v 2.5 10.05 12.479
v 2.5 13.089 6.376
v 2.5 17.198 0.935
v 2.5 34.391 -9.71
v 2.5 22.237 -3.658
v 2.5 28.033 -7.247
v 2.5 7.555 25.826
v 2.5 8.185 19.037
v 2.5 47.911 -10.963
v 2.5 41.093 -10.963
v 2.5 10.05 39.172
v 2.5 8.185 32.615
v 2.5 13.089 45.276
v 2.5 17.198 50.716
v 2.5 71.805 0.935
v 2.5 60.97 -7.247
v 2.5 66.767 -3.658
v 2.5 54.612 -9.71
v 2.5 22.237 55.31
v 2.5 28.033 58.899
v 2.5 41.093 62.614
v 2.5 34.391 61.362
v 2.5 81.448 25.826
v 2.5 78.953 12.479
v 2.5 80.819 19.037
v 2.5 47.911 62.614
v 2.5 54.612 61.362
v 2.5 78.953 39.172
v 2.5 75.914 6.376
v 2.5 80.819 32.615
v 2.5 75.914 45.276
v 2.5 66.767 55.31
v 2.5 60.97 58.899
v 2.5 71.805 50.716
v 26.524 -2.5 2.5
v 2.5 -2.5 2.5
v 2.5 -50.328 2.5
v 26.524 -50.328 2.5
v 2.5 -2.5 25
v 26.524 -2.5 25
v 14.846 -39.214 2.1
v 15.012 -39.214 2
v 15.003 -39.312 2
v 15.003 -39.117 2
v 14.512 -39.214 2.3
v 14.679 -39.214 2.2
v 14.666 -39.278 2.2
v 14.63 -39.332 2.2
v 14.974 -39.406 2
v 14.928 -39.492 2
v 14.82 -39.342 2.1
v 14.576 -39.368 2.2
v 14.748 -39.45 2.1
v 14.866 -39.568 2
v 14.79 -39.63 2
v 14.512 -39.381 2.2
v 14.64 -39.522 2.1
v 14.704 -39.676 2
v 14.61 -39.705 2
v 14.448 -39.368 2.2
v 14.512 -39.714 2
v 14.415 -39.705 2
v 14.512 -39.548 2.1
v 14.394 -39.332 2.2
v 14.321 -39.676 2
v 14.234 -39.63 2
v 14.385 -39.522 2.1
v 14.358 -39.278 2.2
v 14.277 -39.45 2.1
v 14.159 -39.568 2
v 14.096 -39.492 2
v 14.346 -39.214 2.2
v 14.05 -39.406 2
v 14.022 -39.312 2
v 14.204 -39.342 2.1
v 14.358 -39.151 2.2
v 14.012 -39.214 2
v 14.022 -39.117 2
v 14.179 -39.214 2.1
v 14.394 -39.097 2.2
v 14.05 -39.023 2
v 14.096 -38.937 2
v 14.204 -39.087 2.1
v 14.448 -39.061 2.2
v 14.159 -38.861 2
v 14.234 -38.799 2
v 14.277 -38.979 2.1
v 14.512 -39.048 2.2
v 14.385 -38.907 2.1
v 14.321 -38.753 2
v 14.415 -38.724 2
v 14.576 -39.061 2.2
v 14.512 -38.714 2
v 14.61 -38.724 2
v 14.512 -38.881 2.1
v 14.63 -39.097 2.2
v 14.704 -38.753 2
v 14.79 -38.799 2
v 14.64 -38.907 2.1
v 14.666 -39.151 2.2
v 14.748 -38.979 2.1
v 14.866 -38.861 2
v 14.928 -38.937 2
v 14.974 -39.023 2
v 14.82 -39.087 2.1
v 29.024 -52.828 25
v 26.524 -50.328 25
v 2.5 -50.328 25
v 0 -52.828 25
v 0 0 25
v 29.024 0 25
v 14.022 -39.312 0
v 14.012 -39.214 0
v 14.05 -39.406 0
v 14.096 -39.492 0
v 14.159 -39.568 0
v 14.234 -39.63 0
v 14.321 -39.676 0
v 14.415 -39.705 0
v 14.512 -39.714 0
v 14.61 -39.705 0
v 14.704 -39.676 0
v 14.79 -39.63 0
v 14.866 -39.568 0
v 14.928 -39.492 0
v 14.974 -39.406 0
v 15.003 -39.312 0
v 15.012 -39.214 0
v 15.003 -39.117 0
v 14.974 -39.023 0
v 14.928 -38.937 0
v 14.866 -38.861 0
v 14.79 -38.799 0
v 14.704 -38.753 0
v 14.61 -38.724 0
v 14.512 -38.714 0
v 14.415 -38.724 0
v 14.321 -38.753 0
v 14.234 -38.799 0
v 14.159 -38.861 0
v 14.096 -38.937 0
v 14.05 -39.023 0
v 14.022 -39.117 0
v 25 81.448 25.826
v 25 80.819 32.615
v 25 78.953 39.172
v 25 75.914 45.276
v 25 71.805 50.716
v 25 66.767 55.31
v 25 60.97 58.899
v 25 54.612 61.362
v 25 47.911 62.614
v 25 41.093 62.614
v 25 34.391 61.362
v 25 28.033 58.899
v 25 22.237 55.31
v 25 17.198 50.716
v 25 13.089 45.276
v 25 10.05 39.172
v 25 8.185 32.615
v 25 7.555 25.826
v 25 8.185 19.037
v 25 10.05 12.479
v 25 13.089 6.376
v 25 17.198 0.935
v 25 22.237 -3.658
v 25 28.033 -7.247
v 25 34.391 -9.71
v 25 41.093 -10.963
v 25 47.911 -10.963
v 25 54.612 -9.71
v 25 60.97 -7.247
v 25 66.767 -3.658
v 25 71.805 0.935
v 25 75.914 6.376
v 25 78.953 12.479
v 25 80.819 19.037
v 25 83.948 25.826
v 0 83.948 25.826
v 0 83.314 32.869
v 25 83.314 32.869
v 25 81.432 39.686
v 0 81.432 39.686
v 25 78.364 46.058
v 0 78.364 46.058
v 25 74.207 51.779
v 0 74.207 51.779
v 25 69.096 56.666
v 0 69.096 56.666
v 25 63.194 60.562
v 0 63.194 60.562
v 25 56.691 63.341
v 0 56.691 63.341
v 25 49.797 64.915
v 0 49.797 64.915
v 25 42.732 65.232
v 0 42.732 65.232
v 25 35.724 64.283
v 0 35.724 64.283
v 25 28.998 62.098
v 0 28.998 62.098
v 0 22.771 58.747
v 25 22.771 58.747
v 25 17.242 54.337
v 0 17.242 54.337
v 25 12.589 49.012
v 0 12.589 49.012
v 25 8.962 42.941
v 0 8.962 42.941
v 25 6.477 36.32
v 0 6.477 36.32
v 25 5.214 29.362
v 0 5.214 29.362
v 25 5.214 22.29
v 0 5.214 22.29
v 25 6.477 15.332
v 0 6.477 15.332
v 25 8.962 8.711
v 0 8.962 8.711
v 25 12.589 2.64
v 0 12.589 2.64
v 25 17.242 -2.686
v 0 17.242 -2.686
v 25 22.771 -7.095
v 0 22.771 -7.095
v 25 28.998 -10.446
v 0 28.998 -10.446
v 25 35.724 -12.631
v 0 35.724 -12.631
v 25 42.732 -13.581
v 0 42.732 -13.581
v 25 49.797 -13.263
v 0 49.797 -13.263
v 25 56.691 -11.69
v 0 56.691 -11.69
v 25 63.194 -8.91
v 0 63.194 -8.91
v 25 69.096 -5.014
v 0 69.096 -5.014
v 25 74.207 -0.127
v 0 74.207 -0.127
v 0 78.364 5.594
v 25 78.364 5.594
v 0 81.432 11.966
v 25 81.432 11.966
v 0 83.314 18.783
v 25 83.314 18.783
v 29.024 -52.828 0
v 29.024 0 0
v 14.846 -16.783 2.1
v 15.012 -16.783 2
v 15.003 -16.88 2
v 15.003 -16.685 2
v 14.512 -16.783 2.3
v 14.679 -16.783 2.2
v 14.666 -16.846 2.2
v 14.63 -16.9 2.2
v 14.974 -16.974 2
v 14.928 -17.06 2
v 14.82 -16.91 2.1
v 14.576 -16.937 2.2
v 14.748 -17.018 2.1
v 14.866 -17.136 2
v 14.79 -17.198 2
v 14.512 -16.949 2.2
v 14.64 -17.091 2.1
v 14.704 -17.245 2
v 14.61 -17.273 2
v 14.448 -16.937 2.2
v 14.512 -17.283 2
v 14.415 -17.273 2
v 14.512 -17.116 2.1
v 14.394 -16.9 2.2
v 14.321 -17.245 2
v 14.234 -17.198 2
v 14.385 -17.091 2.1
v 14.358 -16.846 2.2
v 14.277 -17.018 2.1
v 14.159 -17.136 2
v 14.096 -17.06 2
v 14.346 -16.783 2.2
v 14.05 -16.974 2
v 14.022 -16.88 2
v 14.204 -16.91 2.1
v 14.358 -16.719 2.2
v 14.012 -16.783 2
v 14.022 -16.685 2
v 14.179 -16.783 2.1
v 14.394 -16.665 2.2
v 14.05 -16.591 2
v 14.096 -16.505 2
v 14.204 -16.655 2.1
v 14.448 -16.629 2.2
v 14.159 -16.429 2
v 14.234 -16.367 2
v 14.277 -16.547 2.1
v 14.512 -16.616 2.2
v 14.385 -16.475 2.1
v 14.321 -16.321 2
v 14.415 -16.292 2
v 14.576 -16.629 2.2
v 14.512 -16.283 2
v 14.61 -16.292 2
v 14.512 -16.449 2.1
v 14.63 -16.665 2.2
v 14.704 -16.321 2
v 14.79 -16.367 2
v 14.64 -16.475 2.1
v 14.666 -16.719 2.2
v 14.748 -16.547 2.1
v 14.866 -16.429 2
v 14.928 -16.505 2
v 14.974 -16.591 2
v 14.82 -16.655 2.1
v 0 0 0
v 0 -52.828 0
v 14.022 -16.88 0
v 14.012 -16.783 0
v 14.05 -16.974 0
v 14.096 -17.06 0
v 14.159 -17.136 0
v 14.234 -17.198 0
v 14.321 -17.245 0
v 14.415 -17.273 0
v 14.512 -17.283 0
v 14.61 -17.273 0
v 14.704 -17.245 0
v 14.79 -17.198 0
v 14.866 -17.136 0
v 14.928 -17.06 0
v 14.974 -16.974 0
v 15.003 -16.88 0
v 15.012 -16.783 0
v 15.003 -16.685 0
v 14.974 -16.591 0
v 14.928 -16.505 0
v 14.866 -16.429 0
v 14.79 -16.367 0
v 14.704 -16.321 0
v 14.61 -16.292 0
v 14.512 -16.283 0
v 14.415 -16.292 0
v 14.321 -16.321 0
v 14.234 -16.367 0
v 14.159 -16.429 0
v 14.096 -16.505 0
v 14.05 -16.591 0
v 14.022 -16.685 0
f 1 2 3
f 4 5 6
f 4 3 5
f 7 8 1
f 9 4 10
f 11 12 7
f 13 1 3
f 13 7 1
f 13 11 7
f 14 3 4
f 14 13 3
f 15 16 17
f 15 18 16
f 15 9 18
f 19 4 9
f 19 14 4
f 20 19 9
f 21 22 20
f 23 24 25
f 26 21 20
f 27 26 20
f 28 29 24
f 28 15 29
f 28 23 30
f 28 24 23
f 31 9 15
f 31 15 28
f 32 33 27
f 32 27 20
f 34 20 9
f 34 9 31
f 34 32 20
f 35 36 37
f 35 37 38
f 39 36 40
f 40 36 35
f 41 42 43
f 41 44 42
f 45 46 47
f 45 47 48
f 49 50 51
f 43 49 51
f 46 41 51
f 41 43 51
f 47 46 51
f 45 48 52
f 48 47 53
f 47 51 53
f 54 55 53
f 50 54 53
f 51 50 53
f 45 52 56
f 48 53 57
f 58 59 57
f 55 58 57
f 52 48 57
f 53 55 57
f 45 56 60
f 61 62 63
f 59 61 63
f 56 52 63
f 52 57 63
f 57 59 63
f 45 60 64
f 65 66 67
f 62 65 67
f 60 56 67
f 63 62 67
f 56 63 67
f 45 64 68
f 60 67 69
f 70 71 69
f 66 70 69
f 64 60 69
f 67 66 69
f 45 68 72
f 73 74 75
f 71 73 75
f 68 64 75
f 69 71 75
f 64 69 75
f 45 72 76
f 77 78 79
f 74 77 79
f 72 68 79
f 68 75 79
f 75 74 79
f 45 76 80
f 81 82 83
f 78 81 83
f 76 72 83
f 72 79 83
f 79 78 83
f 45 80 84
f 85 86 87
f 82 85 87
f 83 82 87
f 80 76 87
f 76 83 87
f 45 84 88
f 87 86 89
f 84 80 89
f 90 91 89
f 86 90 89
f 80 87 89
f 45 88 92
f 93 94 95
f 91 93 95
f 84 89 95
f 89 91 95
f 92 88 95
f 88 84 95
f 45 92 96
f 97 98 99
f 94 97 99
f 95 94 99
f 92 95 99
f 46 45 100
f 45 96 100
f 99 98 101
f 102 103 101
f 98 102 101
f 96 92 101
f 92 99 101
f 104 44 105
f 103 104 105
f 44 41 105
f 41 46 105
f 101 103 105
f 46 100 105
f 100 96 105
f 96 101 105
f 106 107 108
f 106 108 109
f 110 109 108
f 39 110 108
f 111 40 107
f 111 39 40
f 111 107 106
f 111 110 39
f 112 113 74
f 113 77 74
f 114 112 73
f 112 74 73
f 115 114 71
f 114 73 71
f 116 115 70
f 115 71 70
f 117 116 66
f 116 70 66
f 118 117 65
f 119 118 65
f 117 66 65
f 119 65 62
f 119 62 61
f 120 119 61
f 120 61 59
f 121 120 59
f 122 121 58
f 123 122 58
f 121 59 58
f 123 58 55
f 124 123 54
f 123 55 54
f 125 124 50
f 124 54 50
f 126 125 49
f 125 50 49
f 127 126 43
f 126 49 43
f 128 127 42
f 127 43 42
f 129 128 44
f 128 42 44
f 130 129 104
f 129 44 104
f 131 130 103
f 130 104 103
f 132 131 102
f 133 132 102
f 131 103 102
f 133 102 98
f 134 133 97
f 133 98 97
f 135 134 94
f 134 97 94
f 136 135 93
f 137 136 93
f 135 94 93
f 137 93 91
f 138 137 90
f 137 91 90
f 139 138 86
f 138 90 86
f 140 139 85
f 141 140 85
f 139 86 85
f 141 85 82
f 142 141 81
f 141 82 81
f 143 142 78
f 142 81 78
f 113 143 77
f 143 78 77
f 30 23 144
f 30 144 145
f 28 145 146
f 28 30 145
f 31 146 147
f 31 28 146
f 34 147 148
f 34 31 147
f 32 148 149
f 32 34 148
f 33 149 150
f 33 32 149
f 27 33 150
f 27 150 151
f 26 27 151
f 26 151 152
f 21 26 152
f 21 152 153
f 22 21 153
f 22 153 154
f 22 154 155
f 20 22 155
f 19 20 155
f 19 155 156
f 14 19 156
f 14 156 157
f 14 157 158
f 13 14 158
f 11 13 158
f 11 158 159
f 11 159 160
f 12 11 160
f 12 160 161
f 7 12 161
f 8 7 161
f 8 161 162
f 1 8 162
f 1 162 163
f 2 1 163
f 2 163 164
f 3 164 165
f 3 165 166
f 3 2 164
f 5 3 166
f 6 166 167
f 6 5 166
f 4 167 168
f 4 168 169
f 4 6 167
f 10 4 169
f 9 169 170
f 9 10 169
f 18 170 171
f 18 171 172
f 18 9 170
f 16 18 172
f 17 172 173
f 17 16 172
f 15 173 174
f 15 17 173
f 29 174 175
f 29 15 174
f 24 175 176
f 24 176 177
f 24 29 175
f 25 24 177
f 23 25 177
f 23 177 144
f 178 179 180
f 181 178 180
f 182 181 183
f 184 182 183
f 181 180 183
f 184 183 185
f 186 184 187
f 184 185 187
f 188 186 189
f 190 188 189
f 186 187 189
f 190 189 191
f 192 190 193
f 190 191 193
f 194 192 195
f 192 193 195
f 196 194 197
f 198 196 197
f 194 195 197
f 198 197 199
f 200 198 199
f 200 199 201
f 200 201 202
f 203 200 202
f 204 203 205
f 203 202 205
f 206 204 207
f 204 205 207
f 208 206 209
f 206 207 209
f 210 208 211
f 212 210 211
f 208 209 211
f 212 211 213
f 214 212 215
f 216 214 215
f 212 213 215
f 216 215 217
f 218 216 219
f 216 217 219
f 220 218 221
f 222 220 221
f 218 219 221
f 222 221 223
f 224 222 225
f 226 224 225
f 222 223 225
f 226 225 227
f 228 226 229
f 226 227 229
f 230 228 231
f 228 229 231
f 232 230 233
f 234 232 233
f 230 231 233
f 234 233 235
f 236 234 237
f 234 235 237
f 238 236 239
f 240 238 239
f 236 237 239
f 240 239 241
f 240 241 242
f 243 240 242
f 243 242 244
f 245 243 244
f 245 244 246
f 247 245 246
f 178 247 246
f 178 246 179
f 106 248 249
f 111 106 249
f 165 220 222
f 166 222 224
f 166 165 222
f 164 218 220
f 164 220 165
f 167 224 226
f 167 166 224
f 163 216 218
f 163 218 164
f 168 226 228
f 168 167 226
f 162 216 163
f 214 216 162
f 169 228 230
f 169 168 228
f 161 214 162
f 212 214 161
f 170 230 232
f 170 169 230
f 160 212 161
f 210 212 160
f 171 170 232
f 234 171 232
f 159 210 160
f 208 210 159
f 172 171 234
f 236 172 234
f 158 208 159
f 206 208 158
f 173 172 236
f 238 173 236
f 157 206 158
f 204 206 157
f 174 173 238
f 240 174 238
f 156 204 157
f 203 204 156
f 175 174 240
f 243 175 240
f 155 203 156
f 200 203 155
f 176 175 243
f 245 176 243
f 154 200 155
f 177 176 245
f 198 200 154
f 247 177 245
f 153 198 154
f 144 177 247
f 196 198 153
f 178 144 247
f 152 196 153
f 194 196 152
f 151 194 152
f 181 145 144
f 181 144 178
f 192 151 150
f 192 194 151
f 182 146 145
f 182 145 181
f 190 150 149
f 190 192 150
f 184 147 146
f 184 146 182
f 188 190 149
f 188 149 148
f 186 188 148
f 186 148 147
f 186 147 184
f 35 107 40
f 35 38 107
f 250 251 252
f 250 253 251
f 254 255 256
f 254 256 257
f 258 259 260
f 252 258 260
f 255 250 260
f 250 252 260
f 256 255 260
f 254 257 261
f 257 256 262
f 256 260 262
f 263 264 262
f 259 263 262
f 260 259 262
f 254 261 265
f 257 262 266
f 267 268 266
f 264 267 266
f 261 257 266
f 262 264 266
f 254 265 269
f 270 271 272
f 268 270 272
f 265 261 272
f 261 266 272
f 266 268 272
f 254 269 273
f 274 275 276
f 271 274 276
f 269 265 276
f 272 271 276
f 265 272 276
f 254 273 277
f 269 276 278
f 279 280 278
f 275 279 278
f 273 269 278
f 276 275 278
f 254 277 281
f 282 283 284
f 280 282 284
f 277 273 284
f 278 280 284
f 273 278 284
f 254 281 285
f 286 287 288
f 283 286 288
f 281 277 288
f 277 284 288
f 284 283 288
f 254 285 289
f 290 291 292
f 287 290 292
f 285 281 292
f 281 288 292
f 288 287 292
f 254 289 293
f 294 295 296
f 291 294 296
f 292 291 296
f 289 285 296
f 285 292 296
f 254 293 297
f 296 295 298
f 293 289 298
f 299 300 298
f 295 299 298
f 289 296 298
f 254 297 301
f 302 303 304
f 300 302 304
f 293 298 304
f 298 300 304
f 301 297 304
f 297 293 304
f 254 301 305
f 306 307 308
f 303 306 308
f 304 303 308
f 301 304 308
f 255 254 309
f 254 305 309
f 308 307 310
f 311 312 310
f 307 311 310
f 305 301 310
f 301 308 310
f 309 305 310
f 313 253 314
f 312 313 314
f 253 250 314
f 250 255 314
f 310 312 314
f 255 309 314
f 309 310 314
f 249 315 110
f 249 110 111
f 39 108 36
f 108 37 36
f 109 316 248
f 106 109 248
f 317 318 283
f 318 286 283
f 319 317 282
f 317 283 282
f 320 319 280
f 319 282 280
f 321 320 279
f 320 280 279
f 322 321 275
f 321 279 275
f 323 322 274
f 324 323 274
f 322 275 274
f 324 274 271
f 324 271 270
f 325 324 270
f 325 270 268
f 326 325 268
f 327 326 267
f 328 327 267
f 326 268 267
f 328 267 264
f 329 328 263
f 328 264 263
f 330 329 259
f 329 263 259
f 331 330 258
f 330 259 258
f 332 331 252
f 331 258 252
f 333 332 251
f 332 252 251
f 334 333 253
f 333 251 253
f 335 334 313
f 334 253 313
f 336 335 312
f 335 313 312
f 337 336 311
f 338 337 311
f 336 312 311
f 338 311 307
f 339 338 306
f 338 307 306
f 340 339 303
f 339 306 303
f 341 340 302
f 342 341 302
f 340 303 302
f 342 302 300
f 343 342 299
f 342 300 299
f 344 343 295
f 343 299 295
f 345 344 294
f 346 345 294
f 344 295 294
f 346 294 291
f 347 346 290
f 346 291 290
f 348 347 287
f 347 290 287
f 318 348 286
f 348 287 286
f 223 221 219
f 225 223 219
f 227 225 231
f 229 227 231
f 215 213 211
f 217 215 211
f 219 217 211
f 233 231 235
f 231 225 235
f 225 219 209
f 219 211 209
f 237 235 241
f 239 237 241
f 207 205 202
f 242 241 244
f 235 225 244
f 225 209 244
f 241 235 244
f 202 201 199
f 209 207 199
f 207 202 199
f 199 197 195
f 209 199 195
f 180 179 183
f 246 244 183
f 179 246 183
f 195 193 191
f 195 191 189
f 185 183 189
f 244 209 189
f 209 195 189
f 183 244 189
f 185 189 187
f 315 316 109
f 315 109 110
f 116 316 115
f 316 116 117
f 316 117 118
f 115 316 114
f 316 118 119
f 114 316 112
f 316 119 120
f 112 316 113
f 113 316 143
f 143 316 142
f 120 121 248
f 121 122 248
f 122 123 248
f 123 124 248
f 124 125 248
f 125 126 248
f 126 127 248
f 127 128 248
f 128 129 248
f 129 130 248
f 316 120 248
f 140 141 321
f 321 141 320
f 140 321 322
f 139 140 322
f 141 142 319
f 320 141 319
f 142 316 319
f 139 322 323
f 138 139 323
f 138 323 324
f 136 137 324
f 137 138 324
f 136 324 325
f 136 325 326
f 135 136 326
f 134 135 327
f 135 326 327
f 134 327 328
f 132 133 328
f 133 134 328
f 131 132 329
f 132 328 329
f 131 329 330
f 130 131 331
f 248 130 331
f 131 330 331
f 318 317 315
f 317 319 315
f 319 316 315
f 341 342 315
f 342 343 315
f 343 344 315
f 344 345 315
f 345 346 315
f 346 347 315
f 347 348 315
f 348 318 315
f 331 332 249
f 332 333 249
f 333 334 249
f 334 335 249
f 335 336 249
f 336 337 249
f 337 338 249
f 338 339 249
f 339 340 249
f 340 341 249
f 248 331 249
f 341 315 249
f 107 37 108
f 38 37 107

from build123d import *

# Parameters (mm, degrees)
F0_W     = 29.0244165808
F0_H     = 52.8283752501
F1_DEPTH = 25
F2_T     = -2.5
F3_D     = 1
F3_DEPTH = 2
F3_TIP   = 0.3004303095
F4_R     = 39.4461463806
F5_DEPTH = 25
F6_T     = -2.5


with BuildPart() as f1:
    # F0 (on Top) → F1 (new body)
    with BuildSketch(Plane.XY):
        with Locations((14.5122082904, -26.4141876251)):
            Rectangle(F0_W, F0_H)
    extrude(amount=F1_DEPTH)

    # F2
    f2_openings = [f1.faces().sort_by_distance(p)[0] for p in [
        (14.512208, -26.414188, 25),
    ]]
    offset(amount=F2_T, openings=f2_openings)

    # F3
    with Locations(Plane(origin=(0, 0, 0), x_dir=(1, 0, 0), z_dir=(0, 0, -1))):
        with Locations((14.5122082904, 16.7825967073), (14.5122082904, 39.2144955695)):
            Hole(F3_D / 2, depth=F3_DEPTH)
            with Locations((0, 0, -(F3_DEPTH + F3_TIP / 2))):  # 118° drill point
                Cone(0, F3_D / 2, F3_TIP, mode=Mode.SUBTRACT)


with BuildPart() as f5:
    # F4 (on Right) → F5 (new body)
    with BuildSketch(Plane.YZ):
        with Locations((44.5016138256, 25.825900957)):
            Circle(F4_R)
    extrude(amount=F5_DEPTH)

    # F6
    f6_openings = [f5.faces().sort_by_distance(p)[0] for p in [
        (25, 44.501614, 25.825901),
    ]]
    offset(amount=F6_T, openings=f6_openings)


solid = Compound([f1.part, f5.part])
